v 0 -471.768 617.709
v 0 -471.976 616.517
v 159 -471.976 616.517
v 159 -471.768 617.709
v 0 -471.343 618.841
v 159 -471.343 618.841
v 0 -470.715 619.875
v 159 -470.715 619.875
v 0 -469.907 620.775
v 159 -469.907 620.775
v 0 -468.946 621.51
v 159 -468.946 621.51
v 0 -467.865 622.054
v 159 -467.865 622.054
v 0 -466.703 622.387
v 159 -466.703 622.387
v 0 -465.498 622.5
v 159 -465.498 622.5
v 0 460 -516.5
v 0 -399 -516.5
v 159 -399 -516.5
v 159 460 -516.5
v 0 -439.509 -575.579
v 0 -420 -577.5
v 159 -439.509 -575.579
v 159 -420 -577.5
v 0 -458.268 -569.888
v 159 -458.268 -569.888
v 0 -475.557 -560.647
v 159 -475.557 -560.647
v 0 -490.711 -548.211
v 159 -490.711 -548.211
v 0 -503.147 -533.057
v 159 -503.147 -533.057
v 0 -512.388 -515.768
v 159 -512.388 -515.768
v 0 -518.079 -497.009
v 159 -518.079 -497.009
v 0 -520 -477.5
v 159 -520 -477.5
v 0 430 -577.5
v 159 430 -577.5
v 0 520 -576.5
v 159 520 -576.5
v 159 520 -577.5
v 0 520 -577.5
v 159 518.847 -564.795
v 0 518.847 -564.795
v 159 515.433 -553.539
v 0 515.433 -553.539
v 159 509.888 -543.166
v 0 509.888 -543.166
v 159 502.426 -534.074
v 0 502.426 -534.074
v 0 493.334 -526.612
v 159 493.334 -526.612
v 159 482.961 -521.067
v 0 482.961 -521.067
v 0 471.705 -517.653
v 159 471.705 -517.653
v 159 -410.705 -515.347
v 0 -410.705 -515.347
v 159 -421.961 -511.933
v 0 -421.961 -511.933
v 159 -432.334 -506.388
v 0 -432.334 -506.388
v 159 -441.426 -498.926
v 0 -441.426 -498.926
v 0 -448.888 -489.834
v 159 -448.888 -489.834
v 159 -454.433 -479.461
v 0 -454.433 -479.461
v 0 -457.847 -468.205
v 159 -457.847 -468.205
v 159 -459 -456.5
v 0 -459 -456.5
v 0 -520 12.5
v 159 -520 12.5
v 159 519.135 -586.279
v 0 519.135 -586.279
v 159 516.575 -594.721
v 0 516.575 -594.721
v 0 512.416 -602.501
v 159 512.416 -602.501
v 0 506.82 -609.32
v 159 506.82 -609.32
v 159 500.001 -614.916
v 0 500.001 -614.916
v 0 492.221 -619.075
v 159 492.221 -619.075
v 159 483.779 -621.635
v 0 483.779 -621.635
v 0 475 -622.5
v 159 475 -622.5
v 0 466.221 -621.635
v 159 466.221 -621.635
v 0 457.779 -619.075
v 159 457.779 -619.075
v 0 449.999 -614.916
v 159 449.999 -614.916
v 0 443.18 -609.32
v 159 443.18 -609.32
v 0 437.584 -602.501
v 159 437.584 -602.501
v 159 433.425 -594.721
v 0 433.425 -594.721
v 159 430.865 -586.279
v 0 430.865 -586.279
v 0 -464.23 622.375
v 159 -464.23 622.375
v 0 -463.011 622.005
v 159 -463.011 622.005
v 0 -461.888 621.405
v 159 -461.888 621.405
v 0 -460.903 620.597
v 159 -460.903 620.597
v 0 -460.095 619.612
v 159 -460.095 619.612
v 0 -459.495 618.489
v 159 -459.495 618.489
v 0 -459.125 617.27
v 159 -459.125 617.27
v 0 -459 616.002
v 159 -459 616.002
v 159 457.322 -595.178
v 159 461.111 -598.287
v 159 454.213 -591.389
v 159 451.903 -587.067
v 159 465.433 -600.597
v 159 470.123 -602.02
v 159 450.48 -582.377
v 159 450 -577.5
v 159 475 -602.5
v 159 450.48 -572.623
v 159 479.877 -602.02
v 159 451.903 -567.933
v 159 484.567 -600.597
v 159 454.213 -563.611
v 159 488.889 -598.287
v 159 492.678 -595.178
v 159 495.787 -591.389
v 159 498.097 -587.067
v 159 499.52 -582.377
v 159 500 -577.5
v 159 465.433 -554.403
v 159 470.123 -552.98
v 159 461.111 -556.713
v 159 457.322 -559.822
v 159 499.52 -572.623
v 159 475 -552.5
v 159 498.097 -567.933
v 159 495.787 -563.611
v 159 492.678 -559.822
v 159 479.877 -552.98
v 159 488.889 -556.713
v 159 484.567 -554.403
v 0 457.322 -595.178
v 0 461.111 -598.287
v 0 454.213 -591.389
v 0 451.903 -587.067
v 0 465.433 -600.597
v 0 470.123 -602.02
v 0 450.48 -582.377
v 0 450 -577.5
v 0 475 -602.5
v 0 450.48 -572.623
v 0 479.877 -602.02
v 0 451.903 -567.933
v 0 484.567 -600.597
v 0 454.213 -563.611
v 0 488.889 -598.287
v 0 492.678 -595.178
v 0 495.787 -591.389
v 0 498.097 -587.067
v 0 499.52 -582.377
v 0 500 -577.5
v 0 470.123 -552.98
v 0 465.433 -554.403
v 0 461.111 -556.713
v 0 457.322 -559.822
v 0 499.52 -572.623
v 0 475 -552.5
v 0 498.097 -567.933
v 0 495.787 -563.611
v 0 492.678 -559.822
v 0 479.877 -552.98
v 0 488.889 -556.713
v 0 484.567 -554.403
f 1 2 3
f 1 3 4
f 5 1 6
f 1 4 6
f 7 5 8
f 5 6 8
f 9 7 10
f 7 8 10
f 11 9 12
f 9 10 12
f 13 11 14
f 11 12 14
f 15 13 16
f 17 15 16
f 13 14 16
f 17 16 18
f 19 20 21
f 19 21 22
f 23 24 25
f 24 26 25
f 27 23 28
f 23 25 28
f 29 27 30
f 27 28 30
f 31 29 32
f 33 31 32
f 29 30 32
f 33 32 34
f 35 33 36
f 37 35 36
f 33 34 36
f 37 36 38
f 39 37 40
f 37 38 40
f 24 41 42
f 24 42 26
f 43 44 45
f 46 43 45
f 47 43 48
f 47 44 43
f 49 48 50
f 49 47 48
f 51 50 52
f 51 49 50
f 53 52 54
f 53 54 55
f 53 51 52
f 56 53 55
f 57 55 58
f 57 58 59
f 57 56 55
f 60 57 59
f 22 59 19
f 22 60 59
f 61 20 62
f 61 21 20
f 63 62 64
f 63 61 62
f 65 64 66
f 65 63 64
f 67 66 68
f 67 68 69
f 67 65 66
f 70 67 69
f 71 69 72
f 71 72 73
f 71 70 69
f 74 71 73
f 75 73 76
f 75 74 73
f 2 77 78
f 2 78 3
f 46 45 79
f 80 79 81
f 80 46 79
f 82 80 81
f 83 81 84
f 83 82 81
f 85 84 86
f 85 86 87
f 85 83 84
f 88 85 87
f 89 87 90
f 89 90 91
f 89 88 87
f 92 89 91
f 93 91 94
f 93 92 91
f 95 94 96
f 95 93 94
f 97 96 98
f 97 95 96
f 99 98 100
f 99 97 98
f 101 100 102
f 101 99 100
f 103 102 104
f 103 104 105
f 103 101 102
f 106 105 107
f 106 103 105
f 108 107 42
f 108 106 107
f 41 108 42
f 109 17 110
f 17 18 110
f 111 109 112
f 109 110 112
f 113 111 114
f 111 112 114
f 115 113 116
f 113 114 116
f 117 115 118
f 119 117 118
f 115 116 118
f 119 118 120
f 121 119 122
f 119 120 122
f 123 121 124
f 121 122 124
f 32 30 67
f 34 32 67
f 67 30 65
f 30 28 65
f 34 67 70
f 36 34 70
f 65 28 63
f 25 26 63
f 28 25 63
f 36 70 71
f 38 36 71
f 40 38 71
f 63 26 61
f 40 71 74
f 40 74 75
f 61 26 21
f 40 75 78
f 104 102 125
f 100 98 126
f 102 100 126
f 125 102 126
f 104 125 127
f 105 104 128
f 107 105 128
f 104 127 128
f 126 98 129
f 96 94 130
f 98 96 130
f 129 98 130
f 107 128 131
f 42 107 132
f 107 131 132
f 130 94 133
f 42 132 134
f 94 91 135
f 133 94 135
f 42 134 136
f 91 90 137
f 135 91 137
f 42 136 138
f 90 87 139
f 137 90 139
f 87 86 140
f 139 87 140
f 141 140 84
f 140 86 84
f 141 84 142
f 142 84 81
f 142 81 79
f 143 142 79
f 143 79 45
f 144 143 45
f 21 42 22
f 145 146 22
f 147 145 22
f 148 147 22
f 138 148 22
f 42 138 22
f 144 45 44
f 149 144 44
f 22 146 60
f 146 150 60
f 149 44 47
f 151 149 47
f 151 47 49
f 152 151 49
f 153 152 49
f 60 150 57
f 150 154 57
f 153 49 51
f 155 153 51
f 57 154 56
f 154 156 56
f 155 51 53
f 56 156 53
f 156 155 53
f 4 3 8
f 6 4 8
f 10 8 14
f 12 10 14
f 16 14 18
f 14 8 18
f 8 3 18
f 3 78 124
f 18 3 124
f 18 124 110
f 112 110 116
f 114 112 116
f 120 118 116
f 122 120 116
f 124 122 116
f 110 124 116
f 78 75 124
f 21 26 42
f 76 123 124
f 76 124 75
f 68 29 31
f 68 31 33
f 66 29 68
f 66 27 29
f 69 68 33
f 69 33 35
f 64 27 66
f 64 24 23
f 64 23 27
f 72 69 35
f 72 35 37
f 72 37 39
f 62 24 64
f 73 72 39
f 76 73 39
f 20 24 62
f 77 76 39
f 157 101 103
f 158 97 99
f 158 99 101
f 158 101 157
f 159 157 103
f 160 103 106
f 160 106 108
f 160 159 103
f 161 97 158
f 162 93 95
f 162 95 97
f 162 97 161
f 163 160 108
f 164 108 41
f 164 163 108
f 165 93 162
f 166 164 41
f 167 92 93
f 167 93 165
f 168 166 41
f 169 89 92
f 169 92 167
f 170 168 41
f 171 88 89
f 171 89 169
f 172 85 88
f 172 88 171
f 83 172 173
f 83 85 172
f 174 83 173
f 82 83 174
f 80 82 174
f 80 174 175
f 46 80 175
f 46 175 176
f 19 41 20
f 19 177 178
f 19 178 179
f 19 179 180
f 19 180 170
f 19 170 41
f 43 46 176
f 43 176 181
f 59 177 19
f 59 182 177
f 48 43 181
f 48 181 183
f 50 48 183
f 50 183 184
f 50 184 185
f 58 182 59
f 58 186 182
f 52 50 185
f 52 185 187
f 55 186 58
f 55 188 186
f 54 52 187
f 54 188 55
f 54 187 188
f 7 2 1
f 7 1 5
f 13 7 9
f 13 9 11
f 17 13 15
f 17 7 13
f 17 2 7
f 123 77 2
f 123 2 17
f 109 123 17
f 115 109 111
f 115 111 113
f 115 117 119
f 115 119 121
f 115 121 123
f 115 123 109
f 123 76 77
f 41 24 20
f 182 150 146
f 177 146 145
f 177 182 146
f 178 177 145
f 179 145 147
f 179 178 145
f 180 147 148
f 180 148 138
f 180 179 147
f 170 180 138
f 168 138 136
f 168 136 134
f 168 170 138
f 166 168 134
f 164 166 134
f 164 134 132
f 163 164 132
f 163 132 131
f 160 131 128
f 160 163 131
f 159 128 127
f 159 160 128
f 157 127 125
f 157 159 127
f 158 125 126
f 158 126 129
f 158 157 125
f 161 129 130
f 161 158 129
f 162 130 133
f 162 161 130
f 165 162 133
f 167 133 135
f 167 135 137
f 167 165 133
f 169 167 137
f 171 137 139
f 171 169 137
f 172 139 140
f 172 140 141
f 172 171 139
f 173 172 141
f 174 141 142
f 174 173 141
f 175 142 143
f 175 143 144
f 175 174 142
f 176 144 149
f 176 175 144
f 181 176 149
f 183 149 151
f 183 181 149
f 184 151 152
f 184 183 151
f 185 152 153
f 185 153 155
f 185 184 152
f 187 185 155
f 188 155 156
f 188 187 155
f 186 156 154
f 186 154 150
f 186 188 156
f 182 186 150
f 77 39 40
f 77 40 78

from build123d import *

# Parameters (mm, degrees)
SKETCH1_R           = 25
BOSS_EXTRUDE1_DEPTH = 159
FILLET1_R           = 60
FILLET2_R           = 60
FILLET3_R           = 100
FILLET4_R           = 6.498072


with BuildPart() as part:
    # Sketch1 → Boss-Extrude1 (new body)
    with BuildSketch(Plane(origin=(0, 0, 0), x_dir=(0, 0, -1), z_dir=(1, 0, 0))):
        with BuildLine():
            Line((577.5, 430), (577.5, -520))
            Line((577.5, -520), (-12.5, -520))
            Line((-12.5, -520), (-622.5, -471.5))
            Line((-622.5, -471.5), (-622.5, -459))
            Line((-622.5, -459), (516.5, -459))
            Line((516.5, -459), (516.5, 430))
            Line((516.5, 430), (516.5, 520))
            Line((516.5, 520), (577.5, 520))
            ThreePointArc((577.5, 520), (622.5, 475), (577.5, 430))
        make_face()
        with Locations(Location((577.5, 475, 0), (0, 0, 180))):
            Circle(SKETCH1_R, mode=Mode.SUBTRACT)
    extrude(amount=BOSS_EXTRUDE1_DEPTH)

    # Fillet1
    fillet1_edges = [part.edges().sort_by_distance(p)[0] for p in [
        (79.5, 520, -516.5),
    ]]
    fillet(fillet1_edges, radius=FILLET1_R)

    # Fillet2
    fillet2_edges = [part.edges().sort_by_distance(p)[0] for p in [
        (79.5, -459, -516.5),
    ]]
    fillet(fillet2_edges, radius=FILLET2_R)

    # Fillet3
    fillet3_edges = [part.edges().sort_by_distance(p)[0] for p in [
        (79.5, -520, -577.5),
    ]]
    fillet(fillet3_edges, radius=FILLET3_R)

    # Fillet4
    fillet4_edges = [part.edges().sort_by_distance(p)[0] for p in [
        (79.5, -471.5, 622.5),
        (79.5, -459, 622.5),
    ]]
    fillet(fillet4_edges, radius=FILLET4_R - 0.0001)  # a hair under: the kernel refuses the full size


solid = part.part
